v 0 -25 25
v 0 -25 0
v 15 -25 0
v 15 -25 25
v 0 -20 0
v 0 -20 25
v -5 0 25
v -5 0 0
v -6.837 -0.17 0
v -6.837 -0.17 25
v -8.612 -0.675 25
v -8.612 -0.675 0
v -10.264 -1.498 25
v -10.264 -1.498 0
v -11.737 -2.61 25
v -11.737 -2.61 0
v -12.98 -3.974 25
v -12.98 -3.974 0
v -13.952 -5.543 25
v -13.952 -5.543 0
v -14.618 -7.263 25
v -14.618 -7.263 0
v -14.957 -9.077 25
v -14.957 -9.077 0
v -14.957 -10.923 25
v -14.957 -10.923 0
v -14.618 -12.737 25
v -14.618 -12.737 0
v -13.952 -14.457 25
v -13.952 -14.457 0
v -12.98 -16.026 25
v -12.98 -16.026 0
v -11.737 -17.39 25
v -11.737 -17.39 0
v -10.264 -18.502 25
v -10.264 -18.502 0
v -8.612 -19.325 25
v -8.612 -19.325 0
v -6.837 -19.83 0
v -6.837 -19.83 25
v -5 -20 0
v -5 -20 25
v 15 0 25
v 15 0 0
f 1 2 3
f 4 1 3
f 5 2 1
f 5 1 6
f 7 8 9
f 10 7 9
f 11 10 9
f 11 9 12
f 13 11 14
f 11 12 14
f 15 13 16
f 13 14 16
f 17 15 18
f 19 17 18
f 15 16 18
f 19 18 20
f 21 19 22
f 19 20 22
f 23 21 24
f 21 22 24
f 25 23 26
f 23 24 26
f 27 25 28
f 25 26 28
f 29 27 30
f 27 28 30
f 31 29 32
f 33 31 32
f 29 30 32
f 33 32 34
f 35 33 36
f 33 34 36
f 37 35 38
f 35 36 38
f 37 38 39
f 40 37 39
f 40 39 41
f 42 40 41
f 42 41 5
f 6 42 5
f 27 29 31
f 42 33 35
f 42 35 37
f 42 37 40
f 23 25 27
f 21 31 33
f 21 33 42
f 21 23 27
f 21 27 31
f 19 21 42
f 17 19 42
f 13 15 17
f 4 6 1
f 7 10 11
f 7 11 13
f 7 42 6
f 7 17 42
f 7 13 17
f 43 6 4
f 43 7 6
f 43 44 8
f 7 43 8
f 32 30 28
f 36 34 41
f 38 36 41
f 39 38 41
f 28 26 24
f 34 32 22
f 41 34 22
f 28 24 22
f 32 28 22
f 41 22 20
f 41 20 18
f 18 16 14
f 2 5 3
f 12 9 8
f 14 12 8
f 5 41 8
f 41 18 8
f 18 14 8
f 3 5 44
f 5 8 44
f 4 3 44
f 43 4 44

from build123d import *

# Parameters (mm, degrees)
SKETCH1_W           = 15
SKETCH1_H           = 25
BOSS_EXTRUDE1_DEPTH = 25


with BuildPart() as part:
    # Sketch1 → Boss-Extrude1 (new body)
    with BuildSketch(Plane.XY):
        with BuildLine():
            Line((0, -20), (0, 0))
            Line((0, 0), (-5, 0))
            ThreePointArc((-5, 0), (-15, -10), (-5, -20))
            Line((-5, -20), (0, -20))
        make_face()
        with Locations((7.5, -12.5)):
            Rectangle(SKETCH1_W, SKETCH1_H)
    extrude(amount=BOSS_EXTRUDE1_DEPTH)


solid = part.part
